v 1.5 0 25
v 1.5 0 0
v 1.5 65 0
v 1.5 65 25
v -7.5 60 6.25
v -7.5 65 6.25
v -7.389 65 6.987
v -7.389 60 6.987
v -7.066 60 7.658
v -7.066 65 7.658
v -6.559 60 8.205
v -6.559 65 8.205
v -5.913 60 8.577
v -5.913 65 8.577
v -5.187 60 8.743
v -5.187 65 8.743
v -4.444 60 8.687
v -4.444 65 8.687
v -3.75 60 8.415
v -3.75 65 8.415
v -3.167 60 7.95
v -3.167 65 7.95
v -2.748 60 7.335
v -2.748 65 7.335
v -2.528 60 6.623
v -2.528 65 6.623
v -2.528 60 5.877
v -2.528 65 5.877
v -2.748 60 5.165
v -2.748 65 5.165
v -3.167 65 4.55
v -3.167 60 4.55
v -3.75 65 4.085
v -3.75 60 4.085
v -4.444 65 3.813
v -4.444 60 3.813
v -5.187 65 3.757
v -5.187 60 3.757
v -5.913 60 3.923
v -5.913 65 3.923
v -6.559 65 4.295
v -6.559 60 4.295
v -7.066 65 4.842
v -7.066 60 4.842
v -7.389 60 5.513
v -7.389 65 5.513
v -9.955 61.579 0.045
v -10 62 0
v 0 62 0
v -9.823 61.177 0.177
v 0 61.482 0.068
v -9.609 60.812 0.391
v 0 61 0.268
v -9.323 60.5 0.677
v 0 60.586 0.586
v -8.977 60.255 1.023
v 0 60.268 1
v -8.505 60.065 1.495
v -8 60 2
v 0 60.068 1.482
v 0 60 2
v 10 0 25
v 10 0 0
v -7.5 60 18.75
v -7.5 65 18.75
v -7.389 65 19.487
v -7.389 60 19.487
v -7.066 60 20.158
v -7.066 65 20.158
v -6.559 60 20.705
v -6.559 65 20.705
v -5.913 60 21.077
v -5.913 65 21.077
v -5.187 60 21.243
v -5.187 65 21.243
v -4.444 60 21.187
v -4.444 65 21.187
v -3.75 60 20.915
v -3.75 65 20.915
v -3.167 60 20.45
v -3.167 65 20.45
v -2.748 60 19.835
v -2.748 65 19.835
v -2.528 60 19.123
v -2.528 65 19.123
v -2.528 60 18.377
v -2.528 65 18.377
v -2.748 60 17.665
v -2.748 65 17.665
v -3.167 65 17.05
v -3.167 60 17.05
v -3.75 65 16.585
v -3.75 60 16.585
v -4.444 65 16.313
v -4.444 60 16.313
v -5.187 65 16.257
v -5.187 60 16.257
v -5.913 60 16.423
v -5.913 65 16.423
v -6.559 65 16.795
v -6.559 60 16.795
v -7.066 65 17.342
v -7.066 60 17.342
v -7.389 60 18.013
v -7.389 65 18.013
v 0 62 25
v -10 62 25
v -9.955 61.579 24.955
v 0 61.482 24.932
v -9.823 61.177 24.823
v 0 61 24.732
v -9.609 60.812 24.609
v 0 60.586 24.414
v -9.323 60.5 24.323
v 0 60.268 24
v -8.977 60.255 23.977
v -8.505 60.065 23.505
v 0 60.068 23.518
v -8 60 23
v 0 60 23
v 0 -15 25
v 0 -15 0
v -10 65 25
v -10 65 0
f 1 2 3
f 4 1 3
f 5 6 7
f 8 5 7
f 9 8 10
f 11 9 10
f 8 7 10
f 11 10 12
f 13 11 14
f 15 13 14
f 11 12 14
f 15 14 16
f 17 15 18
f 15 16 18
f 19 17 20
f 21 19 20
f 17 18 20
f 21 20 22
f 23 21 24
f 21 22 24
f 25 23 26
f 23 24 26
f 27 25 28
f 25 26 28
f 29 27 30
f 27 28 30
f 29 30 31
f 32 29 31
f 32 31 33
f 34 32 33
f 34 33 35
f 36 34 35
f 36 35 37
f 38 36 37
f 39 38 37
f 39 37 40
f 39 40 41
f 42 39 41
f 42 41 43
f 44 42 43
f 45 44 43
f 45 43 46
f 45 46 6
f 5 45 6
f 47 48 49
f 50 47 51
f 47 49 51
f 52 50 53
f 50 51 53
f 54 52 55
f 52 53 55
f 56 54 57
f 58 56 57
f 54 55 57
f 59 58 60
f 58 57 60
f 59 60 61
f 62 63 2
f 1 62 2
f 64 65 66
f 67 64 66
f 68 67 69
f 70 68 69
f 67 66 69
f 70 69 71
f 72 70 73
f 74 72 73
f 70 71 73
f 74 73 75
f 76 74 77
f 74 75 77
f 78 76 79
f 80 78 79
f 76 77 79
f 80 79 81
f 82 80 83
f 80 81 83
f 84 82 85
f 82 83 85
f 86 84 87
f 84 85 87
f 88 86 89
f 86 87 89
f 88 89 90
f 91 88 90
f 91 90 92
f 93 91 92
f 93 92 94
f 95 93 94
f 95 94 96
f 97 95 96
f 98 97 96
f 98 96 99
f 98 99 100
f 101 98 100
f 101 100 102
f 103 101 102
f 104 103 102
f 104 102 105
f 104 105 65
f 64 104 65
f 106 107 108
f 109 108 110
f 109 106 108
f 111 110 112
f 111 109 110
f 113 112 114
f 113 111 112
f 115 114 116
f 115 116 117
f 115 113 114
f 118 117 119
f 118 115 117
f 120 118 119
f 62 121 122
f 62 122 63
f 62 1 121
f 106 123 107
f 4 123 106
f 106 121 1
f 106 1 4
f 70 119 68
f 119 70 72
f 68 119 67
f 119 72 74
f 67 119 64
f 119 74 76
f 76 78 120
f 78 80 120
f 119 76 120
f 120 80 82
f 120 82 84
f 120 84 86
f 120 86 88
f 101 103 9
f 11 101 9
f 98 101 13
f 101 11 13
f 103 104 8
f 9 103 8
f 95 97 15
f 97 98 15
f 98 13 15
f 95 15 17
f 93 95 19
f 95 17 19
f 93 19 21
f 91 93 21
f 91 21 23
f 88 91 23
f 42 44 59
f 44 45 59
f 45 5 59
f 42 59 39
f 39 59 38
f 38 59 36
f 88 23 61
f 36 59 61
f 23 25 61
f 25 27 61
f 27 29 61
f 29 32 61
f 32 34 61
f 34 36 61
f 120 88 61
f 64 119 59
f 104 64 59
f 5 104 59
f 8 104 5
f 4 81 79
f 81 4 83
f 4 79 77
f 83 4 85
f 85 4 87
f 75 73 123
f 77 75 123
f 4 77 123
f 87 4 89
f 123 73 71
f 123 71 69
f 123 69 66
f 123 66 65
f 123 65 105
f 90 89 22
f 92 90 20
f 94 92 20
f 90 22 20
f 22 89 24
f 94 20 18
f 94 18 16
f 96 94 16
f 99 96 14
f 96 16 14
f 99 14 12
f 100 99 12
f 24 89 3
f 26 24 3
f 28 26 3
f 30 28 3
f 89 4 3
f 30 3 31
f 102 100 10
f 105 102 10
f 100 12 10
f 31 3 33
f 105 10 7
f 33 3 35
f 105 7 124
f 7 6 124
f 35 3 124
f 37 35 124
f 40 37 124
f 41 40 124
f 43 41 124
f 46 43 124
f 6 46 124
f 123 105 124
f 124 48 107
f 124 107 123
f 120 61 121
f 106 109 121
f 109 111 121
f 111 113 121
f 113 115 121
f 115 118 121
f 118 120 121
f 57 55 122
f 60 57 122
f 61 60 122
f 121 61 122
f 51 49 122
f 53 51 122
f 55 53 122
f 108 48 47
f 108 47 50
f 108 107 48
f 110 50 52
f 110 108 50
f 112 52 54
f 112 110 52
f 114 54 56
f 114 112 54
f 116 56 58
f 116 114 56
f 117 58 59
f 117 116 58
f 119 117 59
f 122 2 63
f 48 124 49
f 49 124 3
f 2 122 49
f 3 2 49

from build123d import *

# Parameters (mm, degrees)
F0_W     = 10
F0_H     = 5
F1_DEPTH = 25
F3_D     = 5
F4_R     = 2


# Not quite as in the source:
# - a feature names something its author has since deleted; it is built from what else it names


with BuildPart() as f1:
    # F0 (on Top) → F1 (new body)
    with BuildSketch(Plane.XY):
        Polygon((0, 60), (0, 0), (1.5, 0), (1.5, 65), (0, 65), align=None)
        with Locations((-5, 62.5)):
            Rectangle(F0_W, F0_H)
        Polygon((1.5, 0), (0, 0), (0, -15), (10, 0), align=None)
    extrude(amount=F1_DEPTH)

    # F3 (through all)
    with Locations(Plane.XZ.offset(-60)):
        with Locations((-5, 18.75), (-5, 6.25)):
            Hole(F3_D / 2)

    # F4
    f4_edges = [f1.edges().sort_by_distance(p)[0] for p in [
        (-10, 60, 12.5),
        (-5, 60, 25),
        (-5, 60, 0),
    ]]
    fillet(f4_edges, radius=F4_R)


solid = f1.part
